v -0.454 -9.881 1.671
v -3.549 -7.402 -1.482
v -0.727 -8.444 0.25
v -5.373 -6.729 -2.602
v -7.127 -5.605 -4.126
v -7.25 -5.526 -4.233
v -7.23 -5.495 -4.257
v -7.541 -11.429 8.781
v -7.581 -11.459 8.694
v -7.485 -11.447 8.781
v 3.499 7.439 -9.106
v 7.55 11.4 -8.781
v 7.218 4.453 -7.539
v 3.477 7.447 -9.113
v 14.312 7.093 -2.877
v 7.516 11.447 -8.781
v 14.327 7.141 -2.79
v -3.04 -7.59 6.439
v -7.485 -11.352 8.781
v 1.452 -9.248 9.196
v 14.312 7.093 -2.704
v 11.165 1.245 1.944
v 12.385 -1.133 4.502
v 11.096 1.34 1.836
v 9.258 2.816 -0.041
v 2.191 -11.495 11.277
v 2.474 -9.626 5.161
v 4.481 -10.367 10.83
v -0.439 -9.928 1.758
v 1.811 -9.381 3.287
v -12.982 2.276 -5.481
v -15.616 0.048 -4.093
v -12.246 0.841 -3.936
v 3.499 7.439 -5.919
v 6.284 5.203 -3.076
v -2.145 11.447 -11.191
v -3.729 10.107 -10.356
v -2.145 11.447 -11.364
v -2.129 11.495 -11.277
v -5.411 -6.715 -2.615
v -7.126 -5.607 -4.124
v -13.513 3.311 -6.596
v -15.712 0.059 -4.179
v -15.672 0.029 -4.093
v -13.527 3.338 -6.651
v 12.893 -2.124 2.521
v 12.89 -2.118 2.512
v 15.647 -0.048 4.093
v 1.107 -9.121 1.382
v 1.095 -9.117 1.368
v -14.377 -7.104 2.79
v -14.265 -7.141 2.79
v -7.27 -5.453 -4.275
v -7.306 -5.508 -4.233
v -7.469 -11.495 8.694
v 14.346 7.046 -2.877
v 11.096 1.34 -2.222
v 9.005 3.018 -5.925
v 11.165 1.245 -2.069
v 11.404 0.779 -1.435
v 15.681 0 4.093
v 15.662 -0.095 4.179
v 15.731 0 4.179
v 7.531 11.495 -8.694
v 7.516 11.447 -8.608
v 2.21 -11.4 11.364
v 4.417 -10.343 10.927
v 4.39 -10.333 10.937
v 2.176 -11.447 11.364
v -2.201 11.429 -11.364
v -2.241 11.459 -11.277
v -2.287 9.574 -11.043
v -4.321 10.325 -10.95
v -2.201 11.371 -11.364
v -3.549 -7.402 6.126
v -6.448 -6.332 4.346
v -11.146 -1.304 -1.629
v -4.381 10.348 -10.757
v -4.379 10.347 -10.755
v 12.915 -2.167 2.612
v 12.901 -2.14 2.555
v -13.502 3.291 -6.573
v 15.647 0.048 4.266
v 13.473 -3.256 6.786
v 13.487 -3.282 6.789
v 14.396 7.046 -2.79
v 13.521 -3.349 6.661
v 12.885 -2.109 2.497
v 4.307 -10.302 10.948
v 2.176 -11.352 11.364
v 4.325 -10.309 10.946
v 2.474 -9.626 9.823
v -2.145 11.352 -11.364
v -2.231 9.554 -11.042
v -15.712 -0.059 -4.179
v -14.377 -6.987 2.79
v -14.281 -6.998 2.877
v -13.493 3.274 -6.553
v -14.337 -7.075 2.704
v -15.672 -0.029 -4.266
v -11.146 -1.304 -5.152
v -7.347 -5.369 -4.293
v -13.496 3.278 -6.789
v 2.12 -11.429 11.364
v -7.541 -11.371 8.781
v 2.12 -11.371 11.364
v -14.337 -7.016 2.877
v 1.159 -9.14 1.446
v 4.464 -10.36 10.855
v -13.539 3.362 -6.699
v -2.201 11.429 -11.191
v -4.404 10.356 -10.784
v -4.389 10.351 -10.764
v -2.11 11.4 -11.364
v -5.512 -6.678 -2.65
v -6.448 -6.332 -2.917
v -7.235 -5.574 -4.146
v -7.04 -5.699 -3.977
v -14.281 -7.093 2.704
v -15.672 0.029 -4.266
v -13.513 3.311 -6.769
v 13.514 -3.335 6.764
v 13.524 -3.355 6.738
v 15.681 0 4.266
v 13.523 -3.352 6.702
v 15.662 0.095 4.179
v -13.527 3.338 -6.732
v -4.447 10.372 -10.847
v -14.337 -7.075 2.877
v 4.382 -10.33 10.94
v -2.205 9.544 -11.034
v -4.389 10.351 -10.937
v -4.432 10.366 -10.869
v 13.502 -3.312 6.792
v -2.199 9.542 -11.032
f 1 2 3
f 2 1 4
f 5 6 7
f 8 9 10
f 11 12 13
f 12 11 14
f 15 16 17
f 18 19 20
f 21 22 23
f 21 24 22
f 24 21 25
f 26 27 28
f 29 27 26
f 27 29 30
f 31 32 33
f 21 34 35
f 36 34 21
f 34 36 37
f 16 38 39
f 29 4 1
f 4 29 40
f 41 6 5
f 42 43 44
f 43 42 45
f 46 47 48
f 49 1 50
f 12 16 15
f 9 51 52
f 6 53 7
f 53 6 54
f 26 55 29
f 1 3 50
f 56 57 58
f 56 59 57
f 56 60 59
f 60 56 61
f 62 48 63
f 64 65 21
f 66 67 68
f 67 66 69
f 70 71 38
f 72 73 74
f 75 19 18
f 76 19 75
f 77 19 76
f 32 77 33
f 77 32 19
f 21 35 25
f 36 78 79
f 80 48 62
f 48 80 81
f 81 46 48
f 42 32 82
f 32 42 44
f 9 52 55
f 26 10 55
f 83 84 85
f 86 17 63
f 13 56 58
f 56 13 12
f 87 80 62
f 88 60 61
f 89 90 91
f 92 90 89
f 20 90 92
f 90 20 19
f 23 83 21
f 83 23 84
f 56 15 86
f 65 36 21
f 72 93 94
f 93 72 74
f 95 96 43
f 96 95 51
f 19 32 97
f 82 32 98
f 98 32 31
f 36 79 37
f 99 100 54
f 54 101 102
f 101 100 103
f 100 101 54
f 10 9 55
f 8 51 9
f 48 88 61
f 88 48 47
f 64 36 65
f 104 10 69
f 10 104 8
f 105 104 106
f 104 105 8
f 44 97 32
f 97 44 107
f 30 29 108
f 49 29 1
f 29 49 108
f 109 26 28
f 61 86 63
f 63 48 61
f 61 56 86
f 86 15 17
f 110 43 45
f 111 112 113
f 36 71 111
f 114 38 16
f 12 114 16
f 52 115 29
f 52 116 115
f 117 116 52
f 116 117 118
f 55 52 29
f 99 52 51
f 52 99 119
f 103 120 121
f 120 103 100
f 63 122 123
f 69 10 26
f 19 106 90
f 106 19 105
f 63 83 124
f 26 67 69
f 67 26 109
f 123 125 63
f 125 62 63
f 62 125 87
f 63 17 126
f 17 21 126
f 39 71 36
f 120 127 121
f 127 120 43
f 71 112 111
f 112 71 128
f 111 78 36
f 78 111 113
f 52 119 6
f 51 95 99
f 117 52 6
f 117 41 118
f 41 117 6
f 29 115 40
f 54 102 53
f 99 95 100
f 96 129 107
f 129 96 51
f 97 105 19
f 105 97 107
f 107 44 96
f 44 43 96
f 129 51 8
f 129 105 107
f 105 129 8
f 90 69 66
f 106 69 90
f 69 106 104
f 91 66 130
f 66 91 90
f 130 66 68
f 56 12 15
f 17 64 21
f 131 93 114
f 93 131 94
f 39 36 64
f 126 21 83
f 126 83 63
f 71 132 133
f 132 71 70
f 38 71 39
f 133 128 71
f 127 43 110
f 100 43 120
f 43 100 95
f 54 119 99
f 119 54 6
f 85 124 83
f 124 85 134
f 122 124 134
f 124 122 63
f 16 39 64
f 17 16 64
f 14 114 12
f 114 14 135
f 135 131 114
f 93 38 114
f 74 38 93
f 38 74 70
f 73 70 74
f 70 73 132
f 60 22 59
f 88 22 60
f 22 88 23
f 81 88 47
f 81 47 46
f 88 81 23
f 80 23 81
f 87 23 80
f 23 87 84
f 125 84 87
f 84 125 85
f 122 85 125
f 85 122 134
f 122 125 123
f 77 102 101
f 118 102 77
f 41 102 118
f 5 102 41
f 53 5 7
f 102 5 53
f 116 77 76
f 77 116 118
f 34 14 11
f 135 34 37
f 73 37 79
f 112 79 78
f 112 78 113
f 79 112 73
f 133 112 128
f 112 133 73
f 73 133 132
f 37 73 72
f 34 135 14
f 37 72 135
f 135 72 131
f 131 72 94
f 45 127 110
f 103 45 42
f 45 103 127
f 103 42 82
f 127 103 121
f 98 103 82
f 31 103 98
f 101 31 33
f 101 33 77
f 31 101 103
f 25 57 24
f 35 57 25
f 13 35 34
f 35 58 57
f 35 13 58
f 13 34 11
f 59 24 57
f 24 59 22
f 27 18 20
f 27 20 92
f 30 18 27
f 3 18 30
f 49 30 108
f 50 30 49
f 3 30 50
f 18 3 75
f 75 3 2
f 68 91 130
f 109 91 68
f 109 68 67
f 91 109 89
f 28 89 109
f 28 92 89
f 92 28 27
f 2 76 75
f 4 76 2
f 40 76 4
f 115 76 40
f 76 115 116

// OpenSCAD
// Auto-generated OpenSCAD file

    inner_points = 10*[[-1.4436247026081666, 0.53290472179478, 0.5000000000005375], [1.4436191328390864, -0.5329090469609368, -0.5000000000005375], [-1.1065387952767085, -0.12450860318088203, 1.1739293814812473], [-1.2292961042735038, 0.9867657297769106, -0.36491238710543017], [1.2292905345044236, -0.9867700549430674, 0.36491238710543017], [1.1065332255076283, 0.12450427801472524, -1.1739293814812473], [-0.3467937417511487, -0.7343646996664531, 1.3994576396282619], [-0.5454192400754369, 1.0637149418846232, -1.0904406452529822], [0.5454136703063569, -1.06371926705078, 1.0904406452529822], [0.3467881719820686, 0.7343603745002963, -1.3994576396282619], [-0.9737754103851414, 0.030062411297536226, -0.22552825814749344], [0.4698465073384851, -0.5028444730803222, -0.7255282581480309], [-0.6366895030536831, -0.6273509136781259, 0.44840112333321624], [0.25551790900382226, -0.9567054810624528, 0.13938412895793664], [-0.28989854618707456, 0.10701162340524878, -0.9510565162950456]];

    outer_points = 10*[[1.5631233177982589, 0.0, 0.4179467455373456], [-1.5631233177982589, 0.0, -0.4179467455373456], [1.4296084444676138, 0.7045531263704787, -0.27903149710806596], [1.0995782123374722, -0.7045531263704787, 0.9552835368748945], [-1.0995782123374722, 0.7045531263704787, -0.9552835368748945], [-1.4296084444676138, -0.7045531263704787, 0.27903149710806596], [0.750031735954207, 1.1399909053474344, -0.8694291917899644], [0.2160316030526203, -1.1399909053474344, 1.1277344860194474], [-0.2160316030526203, 1.1399909053474344, -1.1277344860194474], [-0.750031735954207, -1.1399909053474344, 0.8694291917899644], [0.8365540911892785, -0.5478743958362549, 0.0033013484425665762], [-0.7265692266089804, -0.5478743958362549, -0.41464539709477904], [0.7030392178586335, 0.1566787305342239, -0.6936768942028451], [-0.26302412114819385, 0.1566787305342239, -0.9519821884323281], [-0.04699251809557352, -0.9833121748132105, 0.1757522975871193]];

    // Convex hull for inner set (I)
    module inner_hull() {
        hull() {
            for (p = inner_points) {
                translate(p) sphere(r=0.1);
            }
        }
    }

    // Convex hull for outer set (O) minus inner hull (O \ I)
    module outer_minus_inner() {
        difference() {
            hull() {
                for (p = outer_points) {
                    translate(p) sphere(r=0.1);
                }
            }
            inner_hull(); // Subtract inner hull
        }
    }

    // Convex hull for outer set (O) minus all translated inner hulls
    module outer_minus_AllTranslationInner() {
        difference() {
            hull() {
                for (p = outer_points) {
                    translate(p) sphere(r=0.1);
                }
            }
            hull() {
                translate([0,0,50]) inner_hull();
                translate([0,0,-50]) inner_hull();
            }; // Subtract translated inner hulls
        }
    }

    // Difference between outer_minus_inner and outer_minus_AllTranslationInner
    module outer_minus_inner_diff() {
        difference() {
            // Outer minus inner
            difference() {
                hull() {
                    for (p = outer_points) {
                        translate(p) sphere(r=0.1);
                    }
                }
                inner_hull();
            }

            // Subtract Outer minus AllTranslationInner
            difference() {
                hull() {
                    for (p = outer_points) {
                        translate(p) sphere(r=0.1);
                    }
                }
                hull() {
                    translate([0,0,50]) inner_hull();
                    translate([0,0,-50]) inner_hull();
                };
            }
        }
    }

    // Rendering all with colors applied
    color([0, 1, 0, 1]) outer_minus_AllTranslationInner(); // Opaque green
    
